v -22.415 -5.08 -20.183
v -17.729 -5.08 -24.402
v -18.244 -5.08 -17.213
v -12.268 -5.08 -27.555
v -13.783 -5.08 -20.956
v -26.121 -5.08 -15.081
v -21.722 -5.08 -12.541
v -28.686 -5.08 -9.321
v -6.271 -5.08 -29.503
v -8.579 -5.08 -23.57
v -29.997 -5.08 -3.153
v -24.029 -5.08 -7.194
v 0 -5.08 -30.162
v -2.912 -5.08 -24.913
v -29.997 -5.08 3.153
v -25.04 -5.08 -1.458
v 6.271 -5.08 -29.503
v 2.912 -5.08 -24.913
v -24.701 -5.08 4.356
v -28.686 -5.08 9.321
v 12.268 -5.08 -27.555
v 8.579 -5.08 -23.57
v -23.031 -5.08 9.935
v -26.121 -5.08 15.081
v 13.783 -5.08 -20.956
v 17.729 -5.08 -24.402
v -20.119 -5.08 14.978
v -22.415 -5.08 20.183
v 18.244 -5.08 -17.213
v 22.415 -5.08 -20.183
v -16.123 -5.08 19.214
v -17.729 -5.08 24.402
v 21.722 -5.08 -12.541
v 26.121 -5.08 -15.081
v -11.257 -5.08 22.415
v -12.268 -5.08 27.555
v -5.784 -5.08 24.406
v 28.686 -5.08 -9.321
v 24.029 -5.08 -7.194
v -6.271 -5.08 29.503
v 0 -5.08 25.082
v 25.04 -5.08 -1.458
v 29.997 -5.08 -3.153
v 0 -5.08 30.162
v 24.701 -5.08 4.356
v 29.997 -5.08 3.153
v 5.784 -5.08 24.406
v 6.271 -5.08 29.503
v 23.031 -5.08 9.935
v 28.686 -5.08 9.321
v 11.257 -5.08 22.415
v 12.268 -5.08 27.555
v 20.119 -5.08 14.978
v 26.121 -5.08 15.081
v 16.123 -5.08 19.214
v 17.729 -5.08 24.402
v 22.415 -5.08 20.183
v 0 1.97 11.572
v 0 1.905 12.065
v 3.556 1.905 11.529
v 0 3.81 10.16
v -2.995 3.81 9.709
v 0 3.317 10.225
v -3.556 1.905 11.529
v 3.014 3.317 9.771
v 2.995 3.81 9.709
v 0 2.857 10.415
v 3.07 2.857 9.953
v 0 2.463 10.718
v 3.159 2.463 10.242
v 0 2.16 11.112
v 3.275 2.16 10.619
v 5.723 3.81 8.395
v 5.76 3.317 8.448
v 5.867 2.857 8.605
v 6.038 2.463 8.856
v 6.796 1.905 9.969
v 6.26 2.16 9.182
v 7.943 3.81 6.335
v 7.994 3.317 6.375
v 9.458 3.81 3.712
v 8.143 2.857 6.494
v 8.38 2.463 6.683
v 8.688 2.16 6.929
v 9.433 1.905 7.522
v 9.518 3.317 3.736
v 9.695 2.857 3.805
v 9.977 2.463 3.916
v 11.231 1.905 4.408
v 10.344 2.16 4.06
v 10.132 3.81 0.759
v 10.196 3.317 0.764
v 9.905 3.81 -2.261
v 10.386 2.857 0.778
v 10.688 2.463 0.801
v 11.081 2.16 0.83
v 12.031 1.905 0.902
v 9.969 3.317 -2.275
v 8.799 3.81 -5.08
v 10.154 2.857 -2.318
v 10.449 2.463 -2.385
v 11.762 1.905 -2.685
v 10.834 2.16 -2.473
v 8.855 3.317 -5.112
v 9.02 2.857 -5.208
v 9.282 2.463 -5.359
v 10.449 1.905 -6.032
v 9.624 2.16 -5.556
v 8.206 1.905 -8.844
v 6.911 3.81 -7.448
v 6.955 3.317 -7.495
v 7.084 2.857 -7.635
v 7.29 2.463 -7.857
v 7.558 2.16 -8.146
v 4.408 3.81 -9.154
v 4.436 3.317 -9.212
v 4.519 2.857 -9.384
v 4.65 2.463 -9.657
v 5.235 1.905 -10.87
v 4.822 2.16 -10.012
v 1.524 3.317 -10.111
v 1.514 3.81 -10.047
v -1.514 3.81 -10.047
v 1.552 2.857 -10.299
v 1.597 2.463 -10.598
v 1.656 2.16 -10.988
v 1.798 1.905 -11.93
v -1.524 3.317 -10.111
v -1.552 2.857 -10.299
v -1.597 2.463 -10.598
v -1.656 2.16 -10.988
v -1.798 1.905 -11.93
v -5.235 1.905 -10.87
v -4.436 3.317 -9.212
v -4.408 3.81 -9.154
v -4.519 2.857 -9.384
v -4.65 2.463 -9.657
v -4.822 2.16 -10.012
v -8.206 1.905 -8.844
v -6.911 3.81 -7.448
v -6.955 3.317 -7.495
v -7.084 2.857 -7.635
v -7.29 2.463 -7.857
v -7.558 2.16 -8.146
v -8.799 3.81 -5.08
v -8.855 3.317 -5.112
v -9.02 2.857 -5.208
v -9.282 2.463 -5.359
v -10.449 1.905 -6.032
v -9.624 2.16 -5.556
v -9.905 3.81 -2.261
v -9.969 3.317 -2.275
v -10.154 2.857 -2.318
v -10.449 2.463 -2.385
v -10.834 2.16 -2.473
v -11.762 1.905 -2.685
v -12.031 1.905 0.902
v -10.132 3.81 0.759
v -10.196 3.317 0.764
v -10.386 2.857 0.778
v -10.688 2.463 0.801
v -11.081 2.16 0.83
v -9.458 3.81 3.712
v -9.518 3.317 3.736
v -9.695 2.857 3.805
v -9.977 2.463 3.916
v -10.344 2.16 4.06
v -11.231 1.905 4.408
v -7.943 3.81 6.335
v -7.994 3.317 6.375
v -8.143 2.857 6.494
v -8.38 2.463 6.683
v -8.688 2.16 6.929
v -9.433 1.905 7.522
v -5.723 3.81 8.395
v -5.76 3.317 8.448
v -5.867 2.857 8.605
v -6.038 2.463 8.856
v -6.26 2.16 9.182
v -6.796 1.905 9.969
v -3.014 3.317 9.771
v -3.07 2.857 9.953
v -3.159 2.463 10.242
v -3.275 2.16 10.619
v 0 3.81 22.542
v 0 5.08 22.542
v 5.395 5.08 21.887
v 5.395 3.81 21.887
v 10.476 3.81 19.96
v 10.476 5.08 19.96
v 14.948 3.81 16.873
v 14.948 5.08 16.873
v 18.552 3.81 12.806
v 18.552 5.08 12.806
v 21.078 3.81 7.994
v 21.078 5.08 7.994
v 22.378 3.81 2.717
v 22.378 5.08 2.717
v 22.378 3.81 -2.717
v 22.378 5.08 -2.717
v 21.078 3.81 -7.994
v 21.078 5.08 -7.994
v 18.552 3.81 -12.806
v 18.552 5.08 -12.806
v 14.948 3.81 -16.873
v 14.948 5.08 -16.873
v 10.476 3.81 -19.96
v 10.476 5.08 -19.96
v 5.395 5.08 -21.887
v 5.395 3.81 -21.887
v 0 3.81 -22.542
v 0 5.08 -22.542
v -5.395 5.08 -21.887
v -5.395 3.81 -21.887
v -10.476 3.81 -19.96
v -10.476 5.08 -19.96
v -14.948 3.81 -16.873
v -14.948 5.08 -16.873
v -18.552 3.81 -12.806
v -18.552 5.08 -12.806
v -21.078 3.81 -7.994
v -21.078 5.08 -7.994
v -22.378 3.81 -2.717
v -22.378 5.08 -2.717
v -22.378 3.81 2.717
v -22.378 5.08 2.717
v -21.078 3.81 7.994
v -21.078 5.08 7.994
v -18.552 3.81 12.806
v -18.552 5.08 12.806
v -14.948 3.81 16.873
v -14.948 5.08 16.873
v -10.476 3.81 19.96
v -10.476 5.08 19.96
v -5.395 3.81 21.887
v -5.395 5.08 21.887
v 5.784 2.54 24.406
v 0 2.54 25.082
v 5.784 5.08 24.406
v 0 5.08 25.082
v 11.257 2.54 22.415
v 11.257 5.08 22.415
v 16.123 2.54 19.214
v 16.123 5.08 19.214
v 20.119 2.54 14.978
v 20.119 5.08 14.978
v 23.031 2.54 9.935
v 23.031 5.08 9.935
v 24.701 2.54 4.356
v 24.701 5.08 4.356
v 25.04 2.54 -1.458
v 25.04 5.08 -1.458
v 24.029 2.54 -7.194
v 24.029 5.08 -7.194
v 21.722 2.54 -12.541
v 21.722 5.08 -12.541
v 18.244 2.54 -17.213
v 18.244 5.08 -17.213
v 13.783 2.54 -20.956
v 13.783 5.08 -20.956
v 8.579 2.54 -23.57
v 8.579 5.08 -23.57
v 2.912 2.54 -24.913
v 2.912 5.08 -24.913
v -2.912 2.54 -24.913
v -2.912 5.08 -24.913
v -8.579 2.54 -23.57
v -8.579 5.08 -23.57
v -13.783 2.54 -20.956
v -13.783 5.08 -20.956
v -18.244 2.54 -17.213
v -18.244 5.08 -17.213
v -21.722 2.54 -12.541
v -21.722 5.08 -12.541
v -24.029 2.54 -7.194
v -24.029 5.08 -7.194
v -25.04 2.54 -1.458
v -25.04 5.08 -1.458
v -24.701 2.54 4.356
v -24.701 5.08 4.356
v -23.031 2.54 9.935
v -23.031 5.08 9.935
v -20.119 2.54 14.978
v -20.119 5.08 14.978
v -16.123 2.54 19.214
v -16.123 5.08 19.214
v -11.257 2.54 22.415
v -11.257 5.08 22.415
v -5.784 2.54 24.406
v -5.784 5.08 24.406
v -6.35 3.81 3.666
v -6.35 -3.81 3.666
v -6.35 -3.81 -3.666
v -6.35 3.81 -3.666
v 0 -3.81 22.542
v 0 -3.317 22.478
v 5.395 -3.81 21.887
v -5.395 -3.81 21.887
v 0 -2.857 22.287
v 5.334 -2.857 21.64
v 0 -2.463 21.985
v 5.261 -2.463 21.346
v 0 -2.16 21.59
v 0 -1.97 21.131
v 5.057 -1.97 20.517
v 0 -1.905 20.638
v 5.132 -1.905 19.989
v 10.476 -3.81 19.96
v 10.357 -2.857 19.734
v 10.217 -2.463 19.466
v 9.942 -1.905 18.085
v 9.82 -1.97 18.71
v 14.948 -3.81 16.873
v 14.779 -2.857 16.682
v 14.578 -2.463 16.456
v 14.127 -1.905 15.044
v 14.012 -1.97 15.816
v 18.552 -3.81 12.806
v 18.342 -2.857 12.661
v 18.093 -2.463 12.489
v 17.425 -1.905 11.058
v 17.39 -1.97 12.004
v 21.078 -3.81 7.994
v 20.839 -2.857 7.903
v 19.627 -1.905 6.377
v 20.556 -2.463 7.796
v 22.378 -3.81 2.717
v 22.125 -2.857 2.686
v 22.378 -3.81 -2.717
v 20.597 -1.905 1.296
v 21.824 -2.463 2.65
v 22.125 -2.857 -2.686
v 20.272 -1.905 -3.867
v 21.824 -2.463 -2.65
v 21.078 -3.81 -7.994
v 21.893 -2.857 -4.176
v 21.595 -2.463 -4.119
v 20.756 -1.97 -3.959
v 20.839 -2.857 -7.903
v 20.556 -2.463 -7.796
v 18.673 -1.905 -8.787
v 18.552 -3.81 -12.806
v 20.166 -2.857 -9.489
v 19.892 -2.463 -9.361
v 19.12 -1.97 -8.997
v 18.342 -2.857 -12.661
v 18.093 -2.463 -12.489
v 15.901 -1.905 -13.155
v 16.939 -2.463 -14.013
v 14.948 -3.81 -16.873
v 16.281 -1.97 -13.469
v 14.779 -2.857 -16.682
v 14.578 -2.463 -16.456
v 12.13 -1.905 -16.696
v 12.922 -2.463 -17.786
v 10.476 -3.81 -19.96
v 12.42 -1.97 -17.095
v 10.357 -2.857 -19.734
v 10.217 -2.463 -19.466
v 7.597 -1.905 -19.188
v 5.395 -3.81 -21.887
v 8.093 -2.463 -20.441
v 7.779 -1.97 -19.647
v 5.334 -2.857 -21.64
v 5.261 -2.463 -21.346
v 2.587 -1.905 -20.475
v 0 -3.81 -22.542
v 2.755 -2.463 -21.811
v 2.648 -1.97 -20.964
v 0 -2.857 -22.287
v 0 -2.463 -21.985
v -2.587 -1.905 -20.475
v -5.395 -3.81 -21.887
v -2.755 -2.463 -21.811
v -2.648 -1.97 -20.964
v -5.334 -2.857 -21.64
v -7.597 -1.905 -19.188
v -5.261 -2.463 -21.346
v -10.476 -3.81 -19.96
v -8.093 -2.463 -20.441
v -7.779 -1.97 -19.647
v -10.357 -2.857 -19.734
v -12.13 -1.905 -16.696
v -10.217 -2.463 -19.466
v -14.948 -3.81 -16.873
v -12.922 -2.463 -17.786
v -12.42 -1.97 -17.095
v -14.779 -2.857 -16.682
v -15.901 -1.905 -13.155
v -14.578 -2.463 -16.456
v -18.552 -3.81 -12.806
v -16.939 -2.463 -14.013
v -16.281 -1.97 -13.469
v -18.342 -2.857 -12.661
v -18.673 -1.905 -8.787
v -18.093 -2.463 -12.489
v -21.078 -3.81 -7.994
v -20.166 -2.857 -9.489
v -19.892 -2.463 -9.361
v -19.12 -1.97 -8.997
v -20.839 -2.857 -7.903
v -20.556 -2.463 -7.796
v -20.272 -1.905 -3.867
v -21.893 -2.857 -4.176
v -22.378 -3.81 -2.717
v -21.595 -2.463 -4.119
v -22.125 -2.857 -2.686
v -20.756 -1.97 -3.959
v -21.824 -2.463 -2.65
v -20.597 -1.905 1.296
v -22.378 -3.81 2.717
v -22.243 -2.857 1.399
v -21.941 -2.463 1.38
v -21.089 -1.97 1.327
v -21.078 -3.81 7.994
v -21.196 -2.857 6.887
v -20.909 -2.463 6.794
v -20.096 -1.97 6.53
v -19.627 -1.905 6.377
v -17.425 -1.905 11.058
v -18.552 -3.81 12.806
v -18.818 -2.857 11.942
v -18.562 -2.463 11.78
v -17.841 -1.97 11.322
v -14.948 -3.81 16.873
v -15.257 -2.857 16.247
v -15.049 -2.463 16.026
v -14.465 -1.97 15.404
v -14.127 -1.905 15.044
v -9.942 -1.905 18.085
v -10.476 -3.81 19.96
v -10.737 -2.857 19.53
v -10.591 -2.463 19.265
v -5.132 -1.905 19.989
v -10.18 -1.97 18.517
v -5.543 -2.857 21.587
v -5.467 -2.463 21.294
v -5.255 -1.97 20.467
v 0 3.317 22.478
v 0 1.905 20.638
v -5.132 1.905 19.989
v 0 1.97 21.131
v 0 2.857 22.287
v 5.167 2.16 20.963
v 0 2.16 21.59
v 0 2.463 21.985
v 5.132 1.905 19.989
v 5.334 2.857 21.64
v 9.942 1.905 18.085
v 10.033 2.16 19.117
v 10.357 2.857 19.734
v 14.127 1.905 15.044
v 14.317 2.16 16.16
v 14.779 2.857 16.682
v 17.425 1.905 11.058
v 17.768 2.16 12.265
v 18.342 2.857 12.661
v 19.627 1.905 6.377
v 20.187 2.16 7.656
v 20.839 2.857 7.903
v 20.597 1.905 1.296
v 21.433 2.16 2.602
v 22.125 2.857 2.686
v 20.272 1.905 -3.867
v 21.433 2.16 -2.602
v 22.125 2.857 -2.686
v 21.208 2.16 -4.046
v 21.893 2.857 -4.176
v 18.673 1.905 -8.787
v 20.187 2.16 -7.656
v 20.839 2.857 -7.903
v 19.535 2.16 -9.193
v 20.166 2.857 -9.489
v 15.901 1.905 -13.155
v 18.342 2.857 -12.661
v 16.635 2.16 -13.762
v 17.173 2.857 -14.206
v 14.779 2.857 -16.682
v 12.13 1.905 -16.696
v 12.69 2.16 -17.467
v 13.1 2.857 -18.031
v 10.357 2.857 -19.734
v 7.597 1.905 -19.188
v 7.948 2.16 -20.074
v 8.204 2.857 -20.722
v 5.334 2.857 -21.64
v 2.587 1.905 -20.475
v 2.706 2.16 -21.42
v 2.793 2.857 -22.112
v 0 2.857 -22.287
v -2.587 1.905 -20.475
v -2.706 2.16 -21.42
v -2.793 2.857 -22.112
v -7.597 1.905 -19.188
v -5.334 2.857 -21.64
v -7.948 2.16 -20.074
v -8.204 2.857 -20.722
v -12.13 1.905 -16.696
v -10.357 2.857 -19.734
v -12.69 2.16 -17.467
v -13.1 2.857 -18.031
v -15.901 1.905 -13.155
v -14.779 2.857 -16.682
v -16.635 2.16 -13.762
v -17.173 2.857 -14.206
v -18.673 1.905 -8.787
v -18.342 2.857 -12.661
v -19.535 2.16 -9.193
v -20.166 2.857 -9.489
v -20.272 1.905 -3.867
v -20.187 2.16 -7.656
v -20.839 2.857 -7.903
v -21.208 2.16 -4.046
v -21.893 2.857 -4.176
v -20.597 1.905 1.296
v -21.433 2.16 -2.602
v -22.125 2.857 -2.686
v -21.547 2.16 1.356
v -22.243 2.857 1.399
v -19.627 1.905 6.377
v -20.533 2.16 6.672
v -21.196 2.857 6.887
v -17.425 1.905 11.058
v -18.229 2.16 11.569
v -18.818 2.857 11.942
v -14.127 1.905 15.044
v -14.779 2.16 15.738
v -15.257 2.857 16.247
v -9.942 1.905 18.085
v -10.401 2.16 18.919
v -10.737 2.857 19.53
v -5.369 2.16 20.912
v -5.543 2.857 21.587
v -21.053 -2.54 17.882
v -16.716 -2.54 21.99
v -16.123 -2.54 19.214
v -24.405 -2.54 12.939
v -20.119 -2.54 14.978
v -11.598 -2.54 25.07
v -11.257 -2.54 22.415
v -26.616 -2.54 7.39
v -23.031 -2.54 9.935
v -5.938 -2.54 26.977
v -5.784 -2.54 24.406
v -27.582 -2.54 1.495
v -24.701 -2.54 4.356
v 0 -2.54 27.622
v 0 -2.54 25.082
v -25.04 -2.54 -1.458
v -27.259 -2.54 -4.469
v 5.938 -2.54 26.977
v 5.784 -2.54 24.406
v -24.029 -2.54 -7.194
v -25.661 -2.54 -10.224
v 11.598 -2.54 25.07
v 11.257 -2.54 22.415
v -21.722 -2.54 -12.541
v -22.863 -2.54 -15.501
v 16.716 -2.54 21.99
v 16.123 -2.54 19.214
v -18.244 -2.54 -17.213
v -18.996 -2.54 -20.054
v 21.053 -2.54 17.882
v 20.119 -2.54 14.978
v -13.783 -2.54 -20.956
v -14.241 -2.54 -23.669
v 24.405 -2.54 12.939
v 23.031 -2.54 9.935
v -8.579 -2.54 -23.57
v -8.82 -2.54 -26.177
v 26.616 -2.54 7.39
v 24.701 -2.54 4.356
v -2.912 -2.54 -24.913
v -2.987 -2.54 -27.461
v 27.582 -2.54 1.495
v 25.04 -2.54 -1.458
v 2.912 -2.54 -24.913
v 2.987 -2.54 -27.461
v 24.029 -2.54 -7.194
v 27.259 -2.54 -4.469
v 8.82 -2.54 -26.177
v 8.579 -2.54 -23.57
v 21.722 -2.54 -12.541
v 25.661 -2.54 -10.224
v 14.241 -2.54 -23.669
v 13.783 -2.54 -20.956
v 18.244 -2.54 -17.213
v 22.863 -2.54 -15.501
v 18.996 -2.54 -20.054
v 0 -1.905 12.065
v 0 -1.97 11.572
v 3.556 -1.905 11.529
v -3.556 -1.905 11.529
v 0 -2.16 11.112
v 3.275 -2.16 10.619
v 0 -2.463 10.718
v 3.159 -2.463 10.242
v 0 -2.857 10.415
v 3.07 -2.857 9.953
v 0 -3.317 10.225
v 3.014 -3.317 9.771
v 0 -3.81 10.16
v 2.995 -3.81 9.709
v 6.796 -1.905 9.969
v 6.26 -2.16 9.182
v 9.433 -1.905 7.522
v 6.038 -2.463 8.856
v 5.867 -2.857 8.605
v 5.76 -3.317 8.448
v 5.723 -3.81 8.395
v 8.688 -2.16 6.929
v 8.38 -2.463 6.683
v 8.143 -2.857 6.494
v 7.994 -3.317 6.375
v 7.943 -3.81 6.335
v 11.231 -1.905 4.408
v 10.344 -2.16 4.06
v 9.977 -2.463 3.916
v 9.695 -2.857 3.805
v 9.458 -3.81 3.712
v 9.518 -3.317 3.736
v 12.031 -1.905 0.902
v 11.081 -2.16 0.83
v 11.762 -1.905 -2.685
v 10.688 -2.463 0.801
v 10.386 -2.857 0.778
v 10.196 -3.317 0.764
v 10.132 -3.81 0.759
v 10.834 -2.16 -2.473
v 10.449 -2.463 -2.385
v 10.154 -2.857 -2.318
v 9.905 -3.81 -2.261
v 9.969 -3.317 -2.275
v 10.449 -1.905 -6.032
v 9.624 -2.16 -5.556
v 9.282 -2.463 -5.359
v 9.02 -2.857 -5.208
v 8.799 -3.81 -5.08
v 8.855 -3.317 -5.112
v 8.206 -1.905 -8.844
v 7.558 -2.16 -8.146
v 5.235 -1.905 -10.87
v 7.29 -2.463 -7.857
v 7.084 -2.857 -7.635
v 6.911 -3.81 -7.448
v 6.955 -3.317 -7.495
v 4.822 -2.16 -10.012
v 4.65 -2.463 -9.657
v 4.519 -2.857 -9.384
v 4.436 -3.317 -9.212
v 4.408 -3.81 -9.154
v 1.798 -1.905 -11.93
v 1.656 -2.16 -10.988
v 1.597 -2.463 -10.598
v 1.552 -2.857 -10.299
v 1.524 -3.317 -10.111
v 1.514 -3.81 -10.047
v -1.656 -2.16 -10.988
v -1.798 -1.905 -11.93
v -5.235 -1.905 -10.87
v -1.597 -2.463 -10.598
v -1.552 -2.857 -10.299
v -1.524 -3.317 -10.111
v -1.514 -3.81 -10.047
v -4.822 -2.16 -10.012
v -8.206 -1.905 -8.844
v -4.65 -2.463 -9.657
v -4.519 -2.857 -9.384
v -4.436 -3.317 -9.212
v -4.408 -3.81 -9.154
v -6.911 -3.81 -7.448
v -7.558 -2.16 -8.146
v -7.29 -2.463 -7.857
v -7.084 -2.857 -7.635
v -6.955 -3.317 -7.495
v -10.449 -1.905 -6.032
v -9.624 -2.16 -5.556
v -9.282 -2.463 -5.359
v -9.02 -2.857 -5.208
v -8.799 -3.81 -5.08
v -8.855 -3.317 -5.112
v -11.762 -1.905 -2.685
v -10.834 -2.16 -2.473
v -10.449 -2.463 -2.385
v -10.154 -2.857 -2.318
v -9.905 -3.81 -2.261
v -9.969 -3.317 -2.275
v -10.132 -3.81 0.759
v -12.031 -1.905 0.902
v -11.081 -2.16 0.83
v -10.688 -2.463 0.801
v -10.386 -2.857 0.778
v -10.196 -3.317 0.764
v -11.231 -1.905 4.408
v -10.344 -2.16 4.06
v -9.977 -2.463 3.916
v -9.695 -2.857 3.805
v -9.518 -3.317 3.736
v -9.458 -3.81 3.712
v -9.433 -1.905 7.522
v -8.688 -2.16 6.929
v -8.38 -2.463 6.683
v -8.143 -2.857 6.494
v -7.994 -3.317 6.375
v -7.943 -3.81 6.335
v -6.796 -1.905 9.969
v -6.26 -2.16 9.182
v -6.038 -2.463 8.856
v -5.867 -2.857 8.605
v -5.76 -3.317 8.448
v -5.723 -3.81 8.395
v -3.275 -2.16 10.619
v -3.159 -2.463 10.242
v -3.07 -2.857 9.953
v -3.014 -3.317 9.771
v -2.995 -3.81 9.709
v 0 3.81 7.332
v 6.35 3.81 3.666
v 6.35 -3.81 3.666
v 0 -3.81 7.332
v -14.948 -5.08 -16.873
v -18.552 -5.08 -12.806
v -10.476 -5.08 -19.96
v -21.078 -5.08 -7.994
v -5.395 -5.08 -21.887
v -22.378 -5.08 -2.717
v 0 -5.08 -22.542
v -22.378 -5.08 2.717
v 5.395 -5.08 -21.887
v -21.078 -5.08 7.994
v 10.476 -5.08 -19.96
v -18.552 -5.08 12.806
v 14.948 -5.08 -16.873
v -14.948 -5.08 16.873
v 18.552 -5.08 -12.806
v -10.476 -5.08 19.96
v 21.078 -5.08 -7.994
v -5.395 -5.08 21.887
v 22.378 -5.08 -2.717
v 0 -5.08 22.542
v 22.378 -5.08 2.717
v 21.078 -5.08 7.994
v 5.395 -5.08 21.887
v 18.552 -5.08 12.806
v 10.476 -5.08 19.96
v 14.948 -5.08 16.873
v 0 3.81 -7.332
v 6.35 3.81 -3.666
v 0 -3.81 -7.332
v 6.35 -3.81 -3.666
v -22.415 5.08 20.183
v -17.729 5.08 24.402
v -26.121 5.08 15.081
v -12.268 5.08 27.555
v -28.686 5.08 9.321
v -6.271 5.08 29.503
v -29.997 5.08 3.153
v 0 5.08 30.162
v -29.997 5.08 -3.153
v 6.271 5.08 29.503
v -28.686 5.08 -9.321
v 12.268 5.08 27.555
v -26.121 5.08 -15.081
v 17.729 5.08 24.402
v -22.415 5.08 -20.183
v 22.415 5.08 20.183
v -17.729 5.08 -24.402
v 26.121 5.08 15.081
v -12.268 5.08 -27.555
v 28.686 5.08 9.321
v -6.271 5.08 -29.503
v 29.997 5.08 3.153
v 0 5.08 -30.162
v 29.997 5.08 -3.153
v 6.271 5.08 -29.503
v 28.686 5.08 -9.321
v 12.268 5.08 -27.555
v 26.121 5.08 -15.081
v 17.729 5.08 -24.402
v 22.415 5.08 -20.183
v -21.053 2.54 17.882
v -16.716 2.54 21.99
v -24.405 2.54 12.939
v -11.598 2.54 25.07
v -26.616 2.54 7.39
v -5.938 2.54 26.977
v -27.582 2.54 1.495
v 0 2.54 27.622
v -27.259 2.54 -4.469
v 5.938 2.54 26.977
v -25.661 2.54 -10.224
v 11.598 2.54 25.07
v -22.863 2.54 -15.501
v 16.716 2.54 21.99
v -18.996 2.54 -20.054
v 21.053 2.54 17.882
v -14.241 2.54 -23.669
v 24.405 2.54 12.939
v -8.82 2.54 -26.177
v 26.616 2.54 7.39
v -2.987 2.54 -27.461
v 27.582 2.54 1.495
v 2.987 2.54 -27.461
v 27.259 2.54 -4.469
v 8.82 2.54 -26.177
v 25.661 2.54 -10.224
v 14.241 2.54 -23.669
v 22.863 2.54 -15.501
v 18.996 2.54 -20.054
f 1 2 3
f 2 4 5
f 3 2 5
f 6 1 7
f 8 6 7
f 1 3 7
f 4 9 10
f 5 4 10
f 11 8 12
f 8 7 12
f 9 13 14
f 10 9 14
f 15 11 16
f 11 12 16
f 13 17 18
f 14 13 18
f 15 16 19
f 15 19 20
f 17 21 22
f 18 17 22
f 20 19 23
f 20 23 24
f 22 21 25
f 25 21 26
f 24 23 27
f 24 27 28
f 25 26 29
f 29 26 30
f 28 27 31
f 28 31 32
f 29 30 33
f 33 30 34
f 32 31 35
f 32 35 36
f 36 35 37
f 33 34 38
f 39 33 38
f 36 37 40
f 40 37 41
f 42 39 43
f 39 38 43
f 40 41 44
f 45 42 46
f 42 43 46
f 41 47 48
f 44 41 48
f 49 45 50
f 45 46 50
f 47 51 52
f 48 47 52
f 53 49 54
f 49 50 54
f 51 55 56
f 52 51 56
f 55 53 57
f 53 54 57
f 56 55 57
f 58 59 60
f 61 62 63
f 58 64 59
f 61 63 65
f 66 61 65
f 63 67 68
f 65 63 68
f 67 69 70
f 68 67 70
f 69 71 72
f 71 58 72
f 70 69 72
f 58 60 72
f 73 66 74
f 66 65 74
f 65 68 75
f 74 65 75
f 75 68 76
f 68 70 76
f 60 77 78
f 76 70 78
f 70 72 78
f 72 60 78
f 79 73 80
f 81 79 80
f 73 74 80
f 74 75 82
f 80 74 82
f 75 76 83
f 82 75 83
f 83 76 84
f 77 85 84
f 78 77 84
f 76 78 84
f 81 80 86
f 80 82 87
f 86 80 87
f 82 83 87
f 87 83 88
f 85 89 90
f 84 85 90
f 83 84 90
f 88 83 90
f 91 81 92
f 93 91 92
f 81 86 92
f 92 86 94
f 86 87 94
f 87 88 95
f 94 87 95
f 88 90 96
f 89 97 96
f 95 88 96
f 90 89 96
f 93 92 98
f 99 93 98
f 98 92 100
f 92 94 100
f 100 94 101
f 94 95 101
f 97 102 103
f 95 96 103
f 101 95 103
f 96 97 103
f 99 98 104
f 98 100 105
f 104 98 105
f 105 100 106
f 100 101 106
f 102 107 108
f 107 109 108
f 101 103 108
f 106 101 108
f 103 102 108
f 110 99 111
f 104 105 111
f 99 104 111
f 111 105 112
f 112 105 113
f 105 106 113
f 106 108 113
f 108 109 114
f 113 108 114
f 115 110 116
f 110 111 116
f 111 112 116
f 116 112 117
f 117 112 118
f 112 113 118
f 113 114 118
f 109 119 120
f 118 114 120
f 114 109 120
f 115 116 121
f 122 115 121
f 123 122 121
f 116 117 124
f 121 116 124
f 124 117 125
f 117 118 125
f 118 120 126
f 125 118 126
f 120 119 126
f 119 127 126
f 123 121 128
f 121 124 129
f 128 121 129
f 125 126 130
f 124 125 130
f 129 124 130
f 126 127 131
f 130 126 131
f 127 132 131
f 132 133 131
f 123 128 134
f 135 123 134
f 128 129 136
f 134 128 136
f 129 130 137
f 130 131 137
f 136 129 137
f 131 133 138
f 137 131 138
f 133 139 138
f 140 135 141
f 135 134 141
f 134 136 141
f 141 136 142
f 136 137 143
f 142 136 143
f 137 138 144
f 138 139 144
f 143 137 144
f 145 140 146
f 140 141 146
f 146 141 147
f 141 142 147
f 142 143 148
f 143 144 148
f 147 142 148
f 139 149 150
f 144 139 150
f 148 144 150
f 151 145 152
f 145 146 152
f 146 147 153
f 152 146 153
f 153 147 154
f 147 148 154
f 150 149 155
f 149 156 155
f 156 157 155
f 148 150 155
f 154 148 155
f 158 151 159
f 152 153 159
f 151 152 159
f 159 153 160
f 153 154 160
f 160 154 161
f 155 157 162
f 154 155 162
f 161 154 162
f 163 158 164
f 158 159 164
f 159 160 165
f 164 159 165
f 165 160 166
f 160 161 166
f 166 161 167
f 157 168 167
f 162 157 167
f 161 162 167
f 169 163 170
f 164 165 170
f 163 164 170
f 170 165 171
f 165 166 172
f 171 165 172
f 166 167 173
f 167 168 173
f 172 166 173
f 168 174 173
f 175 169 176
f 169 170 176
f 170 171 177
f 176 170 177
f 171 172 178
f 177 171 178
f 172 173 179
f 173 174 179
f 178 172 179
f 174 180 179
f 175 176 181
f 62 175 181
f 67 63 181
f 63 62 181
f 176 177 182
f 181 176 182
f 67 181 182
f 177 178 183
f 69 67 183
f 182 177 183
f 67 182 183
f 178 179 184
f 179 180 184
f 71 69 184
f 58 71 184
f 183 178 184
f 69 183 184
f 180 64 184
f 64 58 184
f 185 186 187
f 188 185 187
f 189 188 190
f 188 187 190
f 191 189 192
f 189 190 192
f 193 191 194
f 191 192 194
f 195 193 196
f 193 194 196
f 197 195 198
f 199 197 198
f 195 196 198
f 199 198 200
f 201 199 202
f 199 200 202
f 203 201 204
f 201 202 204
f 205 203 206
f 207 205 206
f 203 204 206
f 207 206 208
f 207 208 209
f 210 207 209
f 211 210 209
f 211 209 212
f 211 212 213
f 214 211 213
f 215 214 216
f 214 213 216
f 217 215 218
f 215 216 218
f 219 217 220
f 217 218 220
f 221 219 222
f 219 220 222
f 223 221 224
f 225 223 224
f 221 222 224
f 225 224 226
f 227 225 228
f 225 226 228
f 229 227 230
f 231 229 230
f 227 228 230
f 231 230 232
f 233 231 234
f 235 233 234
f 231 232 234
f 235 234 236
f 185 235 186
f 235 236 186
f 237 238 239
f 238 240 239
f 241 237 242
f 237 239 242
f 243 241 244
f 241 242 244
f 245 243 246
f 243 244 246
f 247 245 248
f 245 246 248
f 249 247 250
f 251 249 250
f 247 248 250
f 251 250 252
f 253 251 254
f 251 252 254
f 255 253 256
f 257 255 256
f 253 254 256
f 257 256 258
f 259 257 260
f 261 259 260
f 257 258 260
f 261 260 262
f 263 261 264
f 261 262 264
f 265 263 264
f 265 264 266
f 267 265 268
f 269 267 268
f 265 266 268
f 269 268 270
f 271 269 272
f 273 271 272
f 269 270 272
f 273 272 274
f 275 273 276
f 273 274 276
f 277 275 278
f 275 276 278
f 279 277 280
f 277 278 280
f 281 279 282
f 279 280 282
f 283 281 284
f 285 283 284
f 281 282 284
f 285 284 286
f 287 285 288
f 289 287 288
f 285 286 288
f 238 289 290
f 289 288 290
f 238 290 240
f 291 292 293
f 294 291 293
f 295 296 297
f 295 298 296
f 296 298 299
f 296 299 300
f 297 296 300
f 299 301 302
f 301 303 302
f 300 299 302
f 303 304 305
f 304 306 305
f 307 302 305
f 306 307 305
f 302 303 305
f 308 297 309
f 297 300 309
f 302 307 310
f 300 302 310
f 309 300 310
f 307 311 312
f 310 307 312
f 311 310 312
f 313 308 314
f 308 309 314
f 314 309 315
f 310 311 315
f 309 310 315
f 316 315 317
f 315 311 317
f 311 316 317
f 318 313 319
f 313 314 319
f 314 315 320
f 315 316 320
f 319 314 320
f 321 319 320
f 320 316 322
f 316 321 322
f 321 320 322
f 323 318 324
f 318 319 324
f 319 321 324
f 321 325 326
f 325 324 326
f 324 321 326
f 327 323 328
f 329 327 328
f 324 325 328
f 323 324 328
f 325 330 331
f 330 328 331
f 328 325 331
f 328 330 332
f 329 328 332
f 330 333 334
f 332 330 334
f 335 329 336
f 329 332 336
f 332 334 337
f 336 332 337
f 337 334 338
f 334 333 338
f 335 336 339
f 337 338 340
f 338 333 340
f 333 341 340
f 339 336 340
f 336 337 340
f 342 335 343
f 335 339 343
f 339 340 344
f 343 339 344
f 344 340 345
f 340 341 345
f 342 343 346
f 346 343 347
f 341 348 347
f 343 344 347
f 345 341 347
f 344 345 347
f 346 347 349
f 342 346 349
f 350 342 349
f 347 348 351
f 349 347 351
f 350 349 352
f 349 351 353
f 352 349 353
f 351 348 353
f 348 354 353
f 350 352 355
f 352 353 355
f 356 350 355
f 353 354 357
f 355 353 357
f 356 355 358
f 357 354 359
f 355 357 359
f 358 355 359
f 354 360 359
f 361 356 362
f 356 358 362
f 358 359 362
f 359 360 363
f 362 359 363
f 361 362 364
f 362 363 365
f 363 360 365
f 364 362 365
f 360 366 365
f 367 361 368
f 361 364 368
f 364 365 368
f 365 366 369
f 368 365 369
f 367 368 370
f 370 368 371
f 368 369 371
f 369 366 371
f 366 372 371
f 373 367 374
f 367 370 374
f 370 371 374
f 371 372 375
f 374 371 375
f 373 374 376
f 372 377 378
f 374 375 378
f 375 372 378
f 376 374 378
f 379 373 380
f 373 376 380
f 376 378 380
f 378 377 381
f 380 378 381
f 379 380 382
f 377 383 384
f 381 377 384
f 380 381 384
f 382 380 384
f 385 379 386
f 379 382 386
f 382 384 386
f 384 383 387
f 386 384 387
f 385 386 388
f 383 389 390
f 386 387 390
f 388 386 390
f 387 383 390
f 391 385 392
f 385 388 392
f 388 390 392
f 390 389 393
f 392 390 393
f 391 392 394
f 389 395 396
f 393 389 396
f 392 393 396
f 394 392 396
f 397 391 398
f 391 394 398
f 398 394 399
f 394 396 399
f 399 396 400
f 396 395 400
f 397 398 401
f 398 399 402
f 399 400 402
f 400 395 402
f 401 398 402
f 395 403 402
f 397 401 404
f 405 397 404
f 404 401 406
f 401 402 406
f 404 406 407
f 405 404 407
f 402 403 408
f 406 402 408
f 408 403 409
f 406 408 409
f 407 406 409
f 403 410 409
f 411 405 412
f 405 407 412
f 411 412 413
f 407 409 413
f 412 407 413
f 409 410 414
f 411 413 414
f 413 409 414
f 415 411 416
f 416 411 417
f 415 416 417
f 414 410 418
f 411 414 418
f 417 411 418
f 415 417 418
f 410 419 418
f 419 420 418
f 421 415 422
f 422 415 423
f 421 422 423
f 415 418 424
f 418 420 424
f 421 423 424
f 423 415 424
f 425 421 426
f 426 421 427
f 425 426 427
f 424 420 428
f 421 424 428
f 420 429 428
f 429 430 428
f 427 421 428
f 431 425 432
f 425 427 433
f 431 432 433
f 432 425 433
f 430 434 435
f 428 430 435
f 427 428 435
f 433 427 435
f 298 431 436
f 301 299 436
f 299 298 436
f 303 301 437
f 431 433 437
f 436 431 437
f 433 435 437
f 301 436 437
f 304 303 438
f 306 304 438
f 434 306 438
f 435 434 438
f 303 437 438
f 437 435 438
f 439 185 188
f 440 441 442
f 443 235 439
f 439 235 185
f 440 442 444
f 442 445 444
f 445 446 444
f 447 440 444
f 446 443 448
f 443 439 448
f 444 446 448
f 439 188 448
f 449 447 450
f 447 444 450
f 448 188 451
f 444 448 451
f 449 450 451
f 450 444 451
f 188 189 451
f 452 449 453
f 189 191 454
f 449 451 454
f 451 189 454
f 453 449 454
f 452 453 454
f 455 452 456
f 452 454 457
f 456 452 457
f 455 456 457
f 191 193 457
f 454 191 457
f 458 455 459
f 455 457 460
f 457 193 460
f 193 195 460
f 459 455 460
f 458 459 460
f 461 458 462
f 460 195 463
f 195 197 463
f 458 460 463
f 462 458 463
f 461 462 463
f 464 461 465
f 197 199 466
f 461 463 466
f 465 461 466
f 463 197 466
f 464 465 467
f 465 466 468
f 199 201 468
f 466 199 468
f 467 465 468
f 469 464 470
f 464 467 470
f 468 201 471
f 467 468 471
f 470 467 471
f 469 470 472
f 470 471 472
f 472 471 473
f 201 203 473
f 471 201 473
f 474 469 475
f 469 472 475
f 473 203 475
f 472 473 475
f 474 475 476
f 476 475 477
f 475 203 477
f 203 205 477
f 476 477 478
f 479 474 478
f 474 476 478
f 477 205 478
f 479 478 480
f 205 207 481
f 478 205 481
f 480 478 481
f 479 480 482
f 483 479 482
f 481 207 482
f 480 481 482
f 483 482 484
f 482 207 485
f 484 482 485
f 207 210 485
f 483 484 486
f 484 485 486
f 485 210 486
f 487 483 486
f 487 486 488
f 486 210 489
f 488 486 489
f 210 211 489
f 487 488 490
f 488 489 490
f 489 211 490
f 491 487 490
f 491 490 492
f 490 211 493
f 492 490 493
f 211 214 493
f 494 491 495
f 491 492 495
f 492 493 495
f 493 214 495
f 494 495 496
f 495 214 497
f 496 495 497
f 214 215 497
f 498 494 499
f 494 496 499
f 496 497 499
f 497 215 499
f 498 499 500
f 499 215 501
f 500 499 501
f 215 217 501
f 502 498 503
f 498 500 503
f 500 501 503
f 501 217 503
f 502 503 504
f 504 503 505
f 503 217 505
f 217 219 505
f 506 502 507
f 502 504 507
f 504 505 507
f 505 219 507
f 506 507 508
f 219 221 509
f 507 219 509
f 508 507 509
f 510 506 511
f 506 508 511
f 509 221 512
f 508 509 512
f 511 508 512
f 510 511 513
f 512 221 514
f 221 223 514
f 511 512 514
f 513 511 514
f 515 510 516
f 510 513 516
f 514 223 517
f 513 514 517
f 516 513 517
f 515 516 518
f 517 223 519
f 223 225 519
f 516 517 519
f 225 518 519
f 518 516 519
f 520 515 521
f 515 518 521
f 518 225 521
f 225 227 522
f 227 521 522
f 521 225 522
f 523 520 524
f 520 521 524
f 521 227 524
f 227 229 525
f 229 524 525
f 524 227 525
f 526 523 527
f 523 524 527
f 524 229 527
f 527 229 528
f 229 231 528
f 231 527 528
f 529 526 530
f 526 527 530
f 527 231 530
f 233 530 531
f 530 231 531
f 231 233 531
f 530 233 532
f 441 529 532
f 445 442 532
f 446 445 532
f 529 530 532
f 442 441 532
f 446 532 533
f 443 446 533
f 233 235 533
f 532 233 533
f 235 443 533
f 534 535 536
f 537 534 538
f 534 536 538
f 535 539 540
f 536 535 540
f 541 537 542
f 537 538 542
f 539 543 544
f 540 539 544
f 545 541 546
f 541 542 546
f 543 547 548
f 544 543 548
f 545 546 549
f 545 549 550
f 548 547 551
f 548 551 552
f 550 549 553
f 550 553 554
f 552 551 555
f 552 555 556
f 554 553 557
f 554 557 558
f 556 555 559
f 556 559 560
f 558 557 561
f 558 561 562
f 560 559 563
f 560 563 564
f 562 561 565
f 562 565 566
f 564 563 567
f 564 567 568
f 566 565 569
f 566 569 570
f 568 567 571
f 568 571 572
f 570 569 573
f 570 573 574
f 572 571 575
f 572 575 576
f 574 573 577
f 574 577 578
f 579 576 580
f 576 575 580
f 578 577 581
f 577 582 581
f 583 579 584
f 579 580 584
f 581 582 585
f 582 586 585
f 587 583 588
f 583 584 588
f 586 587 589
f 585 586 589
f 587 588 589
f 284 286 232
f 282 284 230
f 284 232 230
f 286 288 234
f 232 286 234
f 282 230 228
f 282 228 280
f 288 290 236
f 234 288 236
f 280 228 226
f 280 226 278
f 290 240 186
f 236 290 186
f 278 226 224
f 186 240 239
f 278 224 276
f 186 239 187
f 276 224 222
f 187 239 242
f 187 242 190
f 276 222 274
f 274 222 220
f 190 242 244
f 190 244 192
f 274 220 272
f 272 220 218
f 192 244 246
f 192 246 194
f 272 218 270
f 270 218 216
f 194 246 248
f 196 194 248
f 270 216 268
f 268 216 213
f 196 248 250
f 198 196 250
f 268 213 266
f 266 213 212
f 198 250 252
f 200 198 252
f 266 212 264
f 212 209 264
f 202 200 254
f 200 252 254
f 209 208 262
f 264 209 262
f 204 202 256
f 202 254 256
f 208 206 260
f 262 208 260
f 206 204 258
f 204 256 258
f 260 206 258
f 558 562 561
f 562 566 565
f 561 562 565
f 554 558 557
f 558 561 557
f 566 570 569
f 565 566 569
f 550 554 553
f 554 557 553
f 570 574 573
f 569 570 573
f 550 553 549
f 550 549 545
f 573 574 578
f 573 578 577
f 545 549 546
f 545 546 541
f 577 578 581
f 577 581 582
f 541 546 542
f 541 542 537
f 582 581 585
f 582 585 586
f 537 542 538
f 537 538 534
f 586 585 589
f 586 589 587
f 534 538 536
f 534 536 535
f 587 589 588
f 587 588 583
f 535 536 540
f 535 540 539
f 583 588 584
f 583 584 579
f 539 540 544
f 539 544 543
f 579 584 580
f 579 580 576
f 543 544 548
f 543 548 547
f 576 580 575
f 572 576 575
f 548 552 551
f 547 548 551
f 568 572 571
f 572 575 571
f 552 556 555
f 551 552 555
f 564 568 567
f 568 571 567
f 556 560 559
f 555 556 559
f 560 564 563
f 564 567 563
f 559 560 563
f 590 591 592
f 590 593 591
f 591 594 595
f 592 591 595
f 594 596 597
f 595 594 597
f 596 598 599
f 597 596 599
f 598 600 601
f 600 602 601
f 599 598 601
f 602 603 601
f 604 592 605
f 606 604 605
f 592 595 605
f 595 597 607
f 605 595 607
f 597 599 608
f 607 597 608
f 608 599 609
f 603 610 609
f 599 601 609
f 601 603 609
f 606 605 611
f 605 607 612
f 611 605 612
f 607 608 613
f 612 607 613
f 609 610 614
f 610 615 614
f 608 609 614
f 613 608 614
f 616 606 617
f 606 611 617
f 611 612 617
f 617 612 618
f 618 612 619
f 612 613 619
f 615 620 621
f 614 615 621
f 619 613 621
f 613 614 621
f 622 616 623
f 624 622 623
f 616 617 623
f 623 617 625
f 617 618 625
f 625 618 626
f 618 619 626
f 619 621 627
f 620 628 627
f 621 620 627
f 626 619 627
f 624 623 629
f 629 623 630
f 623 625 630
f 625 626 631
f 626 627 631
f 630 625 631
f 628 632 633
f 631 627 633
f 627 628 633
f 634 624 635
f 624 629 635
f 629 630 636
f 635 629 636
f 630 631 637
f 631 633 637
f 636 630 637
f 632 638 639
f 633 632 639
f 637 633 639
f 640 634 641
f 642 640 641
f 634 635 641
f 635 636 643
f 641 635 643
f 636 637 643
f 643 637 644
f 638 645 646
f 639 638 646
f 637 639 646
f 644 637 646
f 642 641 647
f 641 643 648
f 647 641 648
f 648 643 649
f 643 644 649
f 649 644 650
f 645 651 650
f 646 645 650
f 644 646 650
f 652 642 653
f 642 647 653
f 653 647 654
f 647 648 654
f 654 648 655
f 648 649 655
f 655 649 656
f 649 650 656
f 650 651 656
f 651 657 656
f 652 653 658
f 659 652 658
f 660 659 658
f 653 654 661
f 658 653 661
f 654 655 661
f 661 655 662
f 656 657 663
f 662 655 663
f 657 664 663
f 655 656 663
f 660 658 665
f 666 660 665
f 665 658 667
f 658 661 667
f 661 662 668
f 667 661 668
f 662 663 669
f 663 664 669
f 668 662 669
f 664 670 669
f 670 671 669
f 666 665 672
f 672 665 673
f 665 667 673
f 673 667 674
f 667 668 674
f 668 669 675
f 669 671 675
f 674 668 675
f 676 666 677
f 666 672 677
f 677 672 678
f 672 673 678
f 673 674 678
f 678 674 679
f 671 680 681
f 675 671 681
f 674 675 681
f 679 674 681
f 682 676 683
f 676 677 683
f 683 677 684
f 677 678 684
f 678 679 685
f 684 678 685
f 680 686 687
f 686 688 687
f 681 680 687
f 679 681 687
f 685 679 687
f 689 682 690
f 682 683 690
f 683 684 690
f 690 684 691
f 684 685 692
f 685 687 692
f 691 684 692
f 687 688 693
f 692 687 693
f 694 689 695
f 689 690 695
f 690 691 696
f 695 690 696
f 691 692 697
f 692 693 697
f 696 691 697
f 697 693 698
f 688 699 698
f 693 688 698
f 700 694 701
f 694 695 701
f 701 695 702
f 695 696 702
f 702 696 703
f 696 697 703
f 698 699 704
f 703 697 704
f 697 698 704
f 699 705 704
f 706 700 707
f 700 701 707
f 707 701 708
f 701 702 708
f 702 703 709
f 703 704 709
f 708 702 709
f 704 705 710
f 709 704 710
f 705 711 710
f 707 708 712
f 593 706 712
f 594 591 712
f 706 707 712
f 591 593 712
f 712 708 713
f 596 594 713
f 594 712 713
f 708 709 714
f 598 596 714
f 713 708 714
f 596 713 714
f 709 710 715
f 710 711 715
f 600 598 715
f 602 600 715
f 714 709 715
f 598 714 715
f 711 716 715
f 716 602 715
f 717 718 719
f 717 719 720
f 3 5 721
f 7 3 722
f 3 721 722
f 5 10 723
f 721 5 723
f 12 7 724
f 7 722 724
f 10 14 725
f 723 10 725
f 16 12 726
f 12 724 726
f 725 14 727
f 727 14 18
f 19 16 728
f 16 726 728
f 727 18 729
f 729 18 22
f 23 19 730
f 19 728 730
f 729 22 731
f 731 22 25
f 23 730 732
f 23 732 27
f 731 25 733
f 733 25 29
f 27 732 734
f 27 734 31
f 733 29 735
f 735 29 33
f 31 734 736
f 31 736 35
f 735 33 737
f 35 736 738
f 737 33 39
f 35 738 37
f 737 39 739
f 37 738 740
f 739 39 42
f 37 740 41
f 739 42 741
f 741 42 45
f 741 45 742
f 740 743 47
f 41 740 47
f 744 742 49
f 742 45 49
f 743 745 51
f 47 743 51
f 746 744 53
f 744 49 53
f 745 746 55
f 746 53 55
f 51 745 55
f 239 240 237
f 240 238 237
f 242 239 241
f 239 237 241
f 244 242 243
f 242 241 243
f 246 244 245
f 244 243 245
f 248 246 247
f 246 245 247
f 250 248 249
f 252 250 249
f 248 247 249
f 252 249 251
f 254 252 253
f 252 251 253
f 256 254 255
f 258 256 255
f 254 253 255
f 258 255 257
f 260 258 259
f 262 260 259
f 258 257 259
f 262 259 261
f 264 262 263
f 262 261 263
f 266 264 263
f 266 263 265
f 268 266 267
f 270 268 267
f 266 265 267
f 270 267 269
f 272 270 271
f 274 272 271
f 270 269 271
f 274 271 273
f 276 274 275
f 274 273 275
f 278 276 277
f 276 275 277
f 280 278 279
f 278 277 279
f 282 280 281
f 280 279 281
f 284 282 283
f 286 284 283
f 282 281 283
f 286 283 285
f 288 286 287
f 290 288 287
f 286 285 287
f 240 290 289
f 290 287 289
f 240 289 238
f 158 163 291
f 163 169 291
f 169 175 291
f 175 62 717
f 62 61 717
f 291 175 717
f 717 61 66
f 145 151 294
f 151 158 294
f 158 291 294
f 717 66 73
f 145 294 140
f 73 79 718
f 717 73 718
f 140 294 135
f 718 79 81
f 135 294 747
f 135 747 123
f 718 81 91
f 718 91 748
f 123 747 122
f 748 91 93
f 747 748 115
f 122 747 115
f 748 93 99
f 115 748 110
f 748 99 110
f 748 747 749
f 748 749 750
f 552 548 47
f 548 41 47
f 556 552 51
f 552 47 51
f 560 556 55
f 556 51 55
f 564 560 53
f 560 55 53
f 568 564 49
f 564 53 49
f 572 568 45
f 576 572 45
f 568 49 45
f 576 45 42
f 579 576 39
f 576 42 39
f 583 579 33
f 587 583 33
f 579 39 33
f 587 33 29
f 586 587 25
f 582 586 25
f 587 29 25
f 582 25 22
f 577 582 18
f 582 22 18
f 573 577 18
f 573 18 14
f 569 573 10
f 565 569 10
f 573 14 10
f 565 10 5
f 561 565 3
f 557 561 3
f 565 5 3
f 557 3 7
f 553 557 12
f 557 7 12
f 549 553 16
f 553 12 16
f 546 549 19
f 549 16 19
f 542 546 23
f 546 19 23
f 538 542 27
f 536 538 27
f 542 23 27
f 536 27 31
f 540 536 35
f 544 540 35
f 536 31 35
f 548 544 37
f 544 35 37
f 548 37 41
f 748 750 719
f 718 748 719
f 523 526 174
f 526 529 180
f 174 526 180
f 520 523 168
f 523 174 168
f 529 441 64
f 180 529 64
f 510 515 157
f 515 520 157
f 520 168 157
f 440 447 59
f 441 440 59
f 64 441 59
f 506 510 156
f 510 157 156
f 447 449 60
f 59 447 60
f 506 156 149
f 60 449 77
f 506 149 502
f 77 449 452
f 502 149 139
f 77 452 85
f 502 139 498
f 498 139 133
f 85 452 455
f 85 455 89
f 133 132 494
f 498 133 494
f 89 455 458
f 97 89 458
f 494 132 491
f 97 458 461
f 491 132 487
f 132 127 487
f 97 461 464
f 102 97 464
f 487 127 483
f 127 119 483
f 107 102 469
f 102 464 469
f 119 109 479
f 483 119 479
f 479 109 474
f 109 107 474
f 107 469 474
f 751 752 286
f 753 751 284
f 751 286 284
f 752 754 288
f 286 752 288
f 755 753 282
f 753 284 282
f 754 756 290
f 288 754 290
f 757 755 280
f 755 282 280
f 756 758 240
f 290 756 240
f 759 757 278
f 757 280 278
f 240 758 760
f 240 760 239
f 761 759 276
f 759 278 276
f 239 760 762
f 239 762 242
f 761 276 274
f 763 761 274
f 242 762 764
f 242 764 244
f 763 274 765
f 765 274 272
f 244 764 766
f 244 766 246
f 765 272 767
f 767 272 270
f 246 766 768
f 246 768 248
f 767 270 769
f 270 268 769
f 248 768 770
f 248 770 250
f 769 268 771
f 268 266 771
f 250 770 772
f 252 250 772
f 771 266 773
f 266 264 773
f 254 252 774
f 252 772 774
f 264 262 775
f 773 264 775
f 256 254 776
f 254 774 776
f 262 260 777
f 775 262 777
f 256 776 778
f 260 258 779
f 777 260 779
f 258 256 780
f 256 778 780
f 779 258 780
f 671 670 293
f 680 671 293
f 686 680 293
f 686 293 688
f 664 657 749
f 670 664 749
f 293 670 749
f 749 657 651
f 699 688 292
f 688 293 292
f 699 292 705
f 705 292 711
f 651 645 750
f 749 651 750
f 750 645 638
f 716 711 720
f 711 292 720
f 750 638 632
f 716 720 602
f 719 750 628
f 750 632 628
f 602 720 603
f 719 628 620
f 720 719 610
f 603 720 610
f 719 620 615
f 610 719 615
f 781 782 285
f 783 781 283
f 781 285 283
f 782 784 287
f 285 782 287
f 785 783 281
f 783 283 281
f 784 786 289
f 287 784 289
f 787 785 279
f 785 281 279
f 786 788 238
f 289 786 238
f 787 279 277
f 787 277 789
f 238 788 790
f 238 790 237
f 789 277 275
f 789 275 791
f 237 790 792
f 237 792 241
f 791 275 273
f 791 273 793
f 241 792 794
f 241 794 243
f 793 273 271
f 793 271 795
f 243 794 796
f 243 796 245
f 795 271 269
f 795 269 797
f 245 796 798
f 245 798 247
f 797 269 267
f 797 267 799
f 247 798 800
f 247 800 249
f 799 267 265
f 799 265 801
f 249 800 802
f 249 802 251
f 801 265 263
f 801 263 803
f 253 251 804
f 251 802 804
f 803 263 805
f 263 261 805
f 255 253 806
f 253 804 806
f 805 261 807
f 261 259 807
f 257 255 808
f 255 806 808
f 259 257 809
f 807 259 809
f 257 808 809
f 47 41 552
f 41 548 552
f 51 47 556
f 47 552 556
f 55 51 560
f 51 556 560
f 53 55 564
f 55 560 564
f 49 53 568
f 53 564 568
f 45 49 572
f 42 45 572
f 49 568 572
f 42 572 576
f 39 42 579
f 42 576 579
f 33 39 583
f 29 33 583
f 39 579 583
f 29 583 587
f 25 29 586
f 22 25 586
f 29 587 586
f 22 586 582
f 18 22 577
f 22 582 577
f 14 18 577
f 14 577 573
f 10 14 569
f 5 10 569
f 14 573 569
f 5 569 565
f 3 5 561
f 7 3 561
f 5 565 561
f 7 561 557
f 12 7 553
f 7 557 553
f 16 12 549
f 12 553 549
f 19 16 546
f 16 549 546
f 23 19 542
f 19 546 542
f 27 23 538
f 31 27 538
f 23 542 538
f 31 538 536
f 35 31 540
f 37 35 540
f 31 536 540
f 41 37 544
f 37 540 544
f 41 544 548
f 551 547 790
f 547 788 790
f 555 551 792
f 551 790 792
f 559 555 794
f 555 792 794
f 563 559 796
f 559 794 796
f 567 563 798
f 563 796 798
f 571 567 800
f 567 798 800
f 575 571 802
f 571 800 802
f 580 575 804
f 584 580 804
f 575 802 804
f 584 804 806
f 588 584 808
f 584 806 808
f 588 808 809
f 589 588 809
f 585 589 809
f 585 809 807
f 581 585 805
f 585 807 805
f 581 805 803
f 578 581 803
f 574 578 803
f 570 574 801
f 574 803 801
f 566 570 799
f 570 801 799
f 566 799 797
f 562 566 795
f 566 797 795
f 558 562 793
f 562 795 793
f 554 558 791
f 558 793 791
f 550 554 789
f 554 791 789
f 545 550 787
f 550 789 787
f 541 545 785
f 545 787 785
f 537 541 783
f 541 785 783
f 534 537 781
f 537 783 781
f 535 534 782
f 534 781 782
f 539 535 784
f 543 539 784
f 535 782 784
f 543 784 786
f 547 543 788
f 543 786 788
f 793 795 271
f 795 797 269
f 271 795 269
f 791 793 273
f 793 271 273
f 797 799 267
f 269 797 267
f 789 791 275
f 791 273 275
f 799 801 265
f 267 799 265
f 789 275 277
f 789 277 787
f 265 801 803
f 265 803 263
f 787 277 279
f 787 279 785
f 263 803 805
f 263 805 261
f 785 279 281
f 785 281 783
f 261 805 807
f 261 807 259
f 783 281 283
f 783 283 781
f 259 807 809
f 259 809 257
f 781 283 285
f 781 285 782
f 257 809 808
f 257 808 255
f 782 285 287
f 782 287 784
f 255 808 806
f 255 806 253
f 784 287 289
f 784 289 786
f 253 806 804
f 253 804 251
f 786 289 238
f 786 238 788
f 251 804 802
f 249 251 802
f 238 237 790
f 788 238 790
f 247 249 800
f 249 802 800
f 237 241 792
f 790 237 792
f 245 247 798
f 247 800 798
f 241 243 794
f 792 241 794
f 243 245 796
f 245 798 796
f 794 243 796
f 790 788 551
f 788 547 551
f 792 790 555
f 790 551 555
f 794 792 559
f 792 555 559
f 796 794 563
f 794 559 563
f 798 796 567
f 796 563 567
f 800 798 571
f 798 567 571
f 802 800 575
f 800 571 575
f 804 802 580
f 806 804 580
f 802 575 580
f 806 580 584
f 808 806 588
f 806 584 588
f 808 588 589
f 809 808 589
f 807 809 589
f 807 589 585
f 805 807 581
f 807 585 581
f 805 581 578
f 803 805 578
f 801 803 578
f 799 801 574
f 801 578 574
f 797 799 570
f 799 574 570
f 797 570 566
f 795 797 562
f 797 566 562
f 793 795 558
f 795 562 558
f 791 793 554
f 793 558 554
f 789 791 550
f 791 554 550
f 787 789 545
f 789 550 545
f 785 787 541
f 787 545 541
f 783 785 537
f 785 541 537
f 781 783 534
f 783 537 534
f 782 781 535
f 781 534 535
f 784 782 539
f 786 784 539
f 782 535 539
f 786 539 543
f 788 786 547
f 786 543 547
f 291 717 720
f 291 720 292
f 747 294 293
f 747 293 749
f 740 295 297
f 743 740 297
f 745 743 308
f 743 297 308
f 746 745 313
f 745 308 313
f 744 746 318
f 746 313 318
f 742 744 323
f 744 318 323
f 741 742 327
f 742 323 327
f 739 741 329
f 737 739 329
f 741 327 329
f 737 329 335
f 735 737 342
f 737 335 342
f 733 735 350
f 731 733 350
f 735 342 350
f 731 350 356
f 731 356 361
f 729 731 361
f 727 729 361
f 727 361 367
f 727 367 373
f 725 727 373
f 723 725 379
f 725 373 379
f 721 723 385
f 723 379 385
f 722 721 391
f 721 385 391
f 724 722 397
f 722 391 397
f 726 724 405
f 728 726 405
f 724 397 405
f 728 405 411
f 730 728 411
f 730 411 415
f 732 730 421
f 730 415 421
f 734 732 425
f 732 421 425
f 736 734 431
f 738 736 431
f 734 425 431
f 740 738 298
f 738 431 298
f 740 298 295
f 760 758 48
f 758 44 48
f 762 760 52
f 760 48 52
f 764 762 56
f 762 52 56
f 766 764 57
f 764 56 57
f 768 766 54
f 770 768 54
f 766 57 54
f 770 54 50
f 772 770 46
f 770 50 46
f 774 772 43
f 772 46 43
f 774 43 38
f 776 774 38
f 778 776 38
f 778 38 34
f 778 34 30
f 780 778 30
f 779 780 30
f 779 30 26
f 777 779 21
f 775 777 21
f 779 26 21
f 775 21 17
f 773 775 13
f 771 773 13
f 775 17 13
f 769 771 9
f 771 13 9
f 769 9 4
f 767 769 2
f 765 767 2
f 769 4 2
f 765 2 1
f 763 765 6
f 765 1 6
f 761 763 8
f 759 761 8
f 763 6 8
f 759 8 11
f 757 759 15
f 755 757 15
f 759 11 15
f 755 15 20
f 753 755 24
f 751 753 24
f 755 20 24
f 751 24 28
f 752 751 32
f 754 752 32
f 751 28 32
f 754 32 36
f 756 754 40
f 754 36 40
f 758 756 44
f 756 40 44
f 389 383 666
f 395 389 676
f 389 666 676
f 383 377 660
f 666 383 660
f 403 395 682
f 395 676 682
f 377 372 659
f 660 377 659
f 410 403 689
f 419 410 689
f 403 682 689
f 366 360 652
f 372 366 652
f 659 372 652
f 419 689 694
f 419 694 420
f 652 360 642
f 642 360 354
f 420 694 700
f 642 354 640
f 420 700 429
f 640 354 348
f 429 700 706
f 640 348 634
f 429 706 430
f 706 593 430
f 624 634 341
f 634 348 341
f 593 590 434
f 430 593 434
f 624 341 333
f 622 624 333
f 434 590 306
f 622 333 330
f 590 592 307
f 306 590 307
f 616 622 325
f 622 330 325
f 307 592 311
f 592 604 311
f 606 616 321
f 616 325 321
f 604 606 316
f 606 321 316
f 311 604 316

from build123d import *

# Parameters (mm, degrees)
F2_R     = 1.90499
F4_DEPTH = 7.62


# Not quite as in the source:
# - a fillet or chamfer is up to 0.001 mm smaller than in the source, because OpenCascade refuses the exact size


with BuildPart() as f1:
    # F0 (on Right) → F1 (revolve)
    with BuildSketch(Plane.YZ):
        Polygon((-3.81, 10.16), (-3.81, 0), (3.81, 0), (3.81, 10.16), (1.905, 10.16), (1.905, 22.5425), (5.08, 22.5425), (5.08, 25.0825), (2.54, 25.0825), (2.54, 27.6225), (-2.54, 27.6225), (-2.54, 25.0825), (-5.08, 25.0825), (-5.08, 22.5425), (-1.905, 22.5425), (-1.905, 10.16), align=None)
    revolve(axis=Axis((0, 0, 0), (0, 1, 0)))

    # F2 (radius 1.905 in the source; OpenCascade refuses exactly that, so slightly less here)
    f2_edges = [f1.edges().sort_by_distance(p)[0] for p in [
        (0, 1.905, -10.16),
        (0, 1.905, -22.5425),
        (0, -1.905, -10.16),
        (0, -1.905, -22.5425),
    ]]
    fillet(f2_edges, radius=F2_R)

    # F3 (on face) → F4 (cut, through all)
    with BuildSketch(Plane.XZ.offset(3.81)):
        Polygon((6.35, -3.6661742094), (6.35, 3.6661742094), (0, 7.3323484187), (-6.35, 3.6661742094), (-6.35, -3.6661742094), (0, -7.3323484187), align=None)
    extrude(amount=-F4_DEPTH, mode=Mode.SUBTRACT)


with BuildPart() as f6:
    # F5 (on Right) → F6 (revolve)
    with BuildSketch(Plane.YZ):
        Polygon((-5.08, 30.1625), (-5.08, 25.0825), (-2.54, 25.0825), (-2.54, 27.6225), (2.54, 27.6225), (2.54, 25.0825), (5.08, 25.0825), (5.08, 30.1625), align=None)
    revolve(axis=Axis((0, 0, 0), (0, 1, 0)))


solid = Compound([f1.part, f6.part])
